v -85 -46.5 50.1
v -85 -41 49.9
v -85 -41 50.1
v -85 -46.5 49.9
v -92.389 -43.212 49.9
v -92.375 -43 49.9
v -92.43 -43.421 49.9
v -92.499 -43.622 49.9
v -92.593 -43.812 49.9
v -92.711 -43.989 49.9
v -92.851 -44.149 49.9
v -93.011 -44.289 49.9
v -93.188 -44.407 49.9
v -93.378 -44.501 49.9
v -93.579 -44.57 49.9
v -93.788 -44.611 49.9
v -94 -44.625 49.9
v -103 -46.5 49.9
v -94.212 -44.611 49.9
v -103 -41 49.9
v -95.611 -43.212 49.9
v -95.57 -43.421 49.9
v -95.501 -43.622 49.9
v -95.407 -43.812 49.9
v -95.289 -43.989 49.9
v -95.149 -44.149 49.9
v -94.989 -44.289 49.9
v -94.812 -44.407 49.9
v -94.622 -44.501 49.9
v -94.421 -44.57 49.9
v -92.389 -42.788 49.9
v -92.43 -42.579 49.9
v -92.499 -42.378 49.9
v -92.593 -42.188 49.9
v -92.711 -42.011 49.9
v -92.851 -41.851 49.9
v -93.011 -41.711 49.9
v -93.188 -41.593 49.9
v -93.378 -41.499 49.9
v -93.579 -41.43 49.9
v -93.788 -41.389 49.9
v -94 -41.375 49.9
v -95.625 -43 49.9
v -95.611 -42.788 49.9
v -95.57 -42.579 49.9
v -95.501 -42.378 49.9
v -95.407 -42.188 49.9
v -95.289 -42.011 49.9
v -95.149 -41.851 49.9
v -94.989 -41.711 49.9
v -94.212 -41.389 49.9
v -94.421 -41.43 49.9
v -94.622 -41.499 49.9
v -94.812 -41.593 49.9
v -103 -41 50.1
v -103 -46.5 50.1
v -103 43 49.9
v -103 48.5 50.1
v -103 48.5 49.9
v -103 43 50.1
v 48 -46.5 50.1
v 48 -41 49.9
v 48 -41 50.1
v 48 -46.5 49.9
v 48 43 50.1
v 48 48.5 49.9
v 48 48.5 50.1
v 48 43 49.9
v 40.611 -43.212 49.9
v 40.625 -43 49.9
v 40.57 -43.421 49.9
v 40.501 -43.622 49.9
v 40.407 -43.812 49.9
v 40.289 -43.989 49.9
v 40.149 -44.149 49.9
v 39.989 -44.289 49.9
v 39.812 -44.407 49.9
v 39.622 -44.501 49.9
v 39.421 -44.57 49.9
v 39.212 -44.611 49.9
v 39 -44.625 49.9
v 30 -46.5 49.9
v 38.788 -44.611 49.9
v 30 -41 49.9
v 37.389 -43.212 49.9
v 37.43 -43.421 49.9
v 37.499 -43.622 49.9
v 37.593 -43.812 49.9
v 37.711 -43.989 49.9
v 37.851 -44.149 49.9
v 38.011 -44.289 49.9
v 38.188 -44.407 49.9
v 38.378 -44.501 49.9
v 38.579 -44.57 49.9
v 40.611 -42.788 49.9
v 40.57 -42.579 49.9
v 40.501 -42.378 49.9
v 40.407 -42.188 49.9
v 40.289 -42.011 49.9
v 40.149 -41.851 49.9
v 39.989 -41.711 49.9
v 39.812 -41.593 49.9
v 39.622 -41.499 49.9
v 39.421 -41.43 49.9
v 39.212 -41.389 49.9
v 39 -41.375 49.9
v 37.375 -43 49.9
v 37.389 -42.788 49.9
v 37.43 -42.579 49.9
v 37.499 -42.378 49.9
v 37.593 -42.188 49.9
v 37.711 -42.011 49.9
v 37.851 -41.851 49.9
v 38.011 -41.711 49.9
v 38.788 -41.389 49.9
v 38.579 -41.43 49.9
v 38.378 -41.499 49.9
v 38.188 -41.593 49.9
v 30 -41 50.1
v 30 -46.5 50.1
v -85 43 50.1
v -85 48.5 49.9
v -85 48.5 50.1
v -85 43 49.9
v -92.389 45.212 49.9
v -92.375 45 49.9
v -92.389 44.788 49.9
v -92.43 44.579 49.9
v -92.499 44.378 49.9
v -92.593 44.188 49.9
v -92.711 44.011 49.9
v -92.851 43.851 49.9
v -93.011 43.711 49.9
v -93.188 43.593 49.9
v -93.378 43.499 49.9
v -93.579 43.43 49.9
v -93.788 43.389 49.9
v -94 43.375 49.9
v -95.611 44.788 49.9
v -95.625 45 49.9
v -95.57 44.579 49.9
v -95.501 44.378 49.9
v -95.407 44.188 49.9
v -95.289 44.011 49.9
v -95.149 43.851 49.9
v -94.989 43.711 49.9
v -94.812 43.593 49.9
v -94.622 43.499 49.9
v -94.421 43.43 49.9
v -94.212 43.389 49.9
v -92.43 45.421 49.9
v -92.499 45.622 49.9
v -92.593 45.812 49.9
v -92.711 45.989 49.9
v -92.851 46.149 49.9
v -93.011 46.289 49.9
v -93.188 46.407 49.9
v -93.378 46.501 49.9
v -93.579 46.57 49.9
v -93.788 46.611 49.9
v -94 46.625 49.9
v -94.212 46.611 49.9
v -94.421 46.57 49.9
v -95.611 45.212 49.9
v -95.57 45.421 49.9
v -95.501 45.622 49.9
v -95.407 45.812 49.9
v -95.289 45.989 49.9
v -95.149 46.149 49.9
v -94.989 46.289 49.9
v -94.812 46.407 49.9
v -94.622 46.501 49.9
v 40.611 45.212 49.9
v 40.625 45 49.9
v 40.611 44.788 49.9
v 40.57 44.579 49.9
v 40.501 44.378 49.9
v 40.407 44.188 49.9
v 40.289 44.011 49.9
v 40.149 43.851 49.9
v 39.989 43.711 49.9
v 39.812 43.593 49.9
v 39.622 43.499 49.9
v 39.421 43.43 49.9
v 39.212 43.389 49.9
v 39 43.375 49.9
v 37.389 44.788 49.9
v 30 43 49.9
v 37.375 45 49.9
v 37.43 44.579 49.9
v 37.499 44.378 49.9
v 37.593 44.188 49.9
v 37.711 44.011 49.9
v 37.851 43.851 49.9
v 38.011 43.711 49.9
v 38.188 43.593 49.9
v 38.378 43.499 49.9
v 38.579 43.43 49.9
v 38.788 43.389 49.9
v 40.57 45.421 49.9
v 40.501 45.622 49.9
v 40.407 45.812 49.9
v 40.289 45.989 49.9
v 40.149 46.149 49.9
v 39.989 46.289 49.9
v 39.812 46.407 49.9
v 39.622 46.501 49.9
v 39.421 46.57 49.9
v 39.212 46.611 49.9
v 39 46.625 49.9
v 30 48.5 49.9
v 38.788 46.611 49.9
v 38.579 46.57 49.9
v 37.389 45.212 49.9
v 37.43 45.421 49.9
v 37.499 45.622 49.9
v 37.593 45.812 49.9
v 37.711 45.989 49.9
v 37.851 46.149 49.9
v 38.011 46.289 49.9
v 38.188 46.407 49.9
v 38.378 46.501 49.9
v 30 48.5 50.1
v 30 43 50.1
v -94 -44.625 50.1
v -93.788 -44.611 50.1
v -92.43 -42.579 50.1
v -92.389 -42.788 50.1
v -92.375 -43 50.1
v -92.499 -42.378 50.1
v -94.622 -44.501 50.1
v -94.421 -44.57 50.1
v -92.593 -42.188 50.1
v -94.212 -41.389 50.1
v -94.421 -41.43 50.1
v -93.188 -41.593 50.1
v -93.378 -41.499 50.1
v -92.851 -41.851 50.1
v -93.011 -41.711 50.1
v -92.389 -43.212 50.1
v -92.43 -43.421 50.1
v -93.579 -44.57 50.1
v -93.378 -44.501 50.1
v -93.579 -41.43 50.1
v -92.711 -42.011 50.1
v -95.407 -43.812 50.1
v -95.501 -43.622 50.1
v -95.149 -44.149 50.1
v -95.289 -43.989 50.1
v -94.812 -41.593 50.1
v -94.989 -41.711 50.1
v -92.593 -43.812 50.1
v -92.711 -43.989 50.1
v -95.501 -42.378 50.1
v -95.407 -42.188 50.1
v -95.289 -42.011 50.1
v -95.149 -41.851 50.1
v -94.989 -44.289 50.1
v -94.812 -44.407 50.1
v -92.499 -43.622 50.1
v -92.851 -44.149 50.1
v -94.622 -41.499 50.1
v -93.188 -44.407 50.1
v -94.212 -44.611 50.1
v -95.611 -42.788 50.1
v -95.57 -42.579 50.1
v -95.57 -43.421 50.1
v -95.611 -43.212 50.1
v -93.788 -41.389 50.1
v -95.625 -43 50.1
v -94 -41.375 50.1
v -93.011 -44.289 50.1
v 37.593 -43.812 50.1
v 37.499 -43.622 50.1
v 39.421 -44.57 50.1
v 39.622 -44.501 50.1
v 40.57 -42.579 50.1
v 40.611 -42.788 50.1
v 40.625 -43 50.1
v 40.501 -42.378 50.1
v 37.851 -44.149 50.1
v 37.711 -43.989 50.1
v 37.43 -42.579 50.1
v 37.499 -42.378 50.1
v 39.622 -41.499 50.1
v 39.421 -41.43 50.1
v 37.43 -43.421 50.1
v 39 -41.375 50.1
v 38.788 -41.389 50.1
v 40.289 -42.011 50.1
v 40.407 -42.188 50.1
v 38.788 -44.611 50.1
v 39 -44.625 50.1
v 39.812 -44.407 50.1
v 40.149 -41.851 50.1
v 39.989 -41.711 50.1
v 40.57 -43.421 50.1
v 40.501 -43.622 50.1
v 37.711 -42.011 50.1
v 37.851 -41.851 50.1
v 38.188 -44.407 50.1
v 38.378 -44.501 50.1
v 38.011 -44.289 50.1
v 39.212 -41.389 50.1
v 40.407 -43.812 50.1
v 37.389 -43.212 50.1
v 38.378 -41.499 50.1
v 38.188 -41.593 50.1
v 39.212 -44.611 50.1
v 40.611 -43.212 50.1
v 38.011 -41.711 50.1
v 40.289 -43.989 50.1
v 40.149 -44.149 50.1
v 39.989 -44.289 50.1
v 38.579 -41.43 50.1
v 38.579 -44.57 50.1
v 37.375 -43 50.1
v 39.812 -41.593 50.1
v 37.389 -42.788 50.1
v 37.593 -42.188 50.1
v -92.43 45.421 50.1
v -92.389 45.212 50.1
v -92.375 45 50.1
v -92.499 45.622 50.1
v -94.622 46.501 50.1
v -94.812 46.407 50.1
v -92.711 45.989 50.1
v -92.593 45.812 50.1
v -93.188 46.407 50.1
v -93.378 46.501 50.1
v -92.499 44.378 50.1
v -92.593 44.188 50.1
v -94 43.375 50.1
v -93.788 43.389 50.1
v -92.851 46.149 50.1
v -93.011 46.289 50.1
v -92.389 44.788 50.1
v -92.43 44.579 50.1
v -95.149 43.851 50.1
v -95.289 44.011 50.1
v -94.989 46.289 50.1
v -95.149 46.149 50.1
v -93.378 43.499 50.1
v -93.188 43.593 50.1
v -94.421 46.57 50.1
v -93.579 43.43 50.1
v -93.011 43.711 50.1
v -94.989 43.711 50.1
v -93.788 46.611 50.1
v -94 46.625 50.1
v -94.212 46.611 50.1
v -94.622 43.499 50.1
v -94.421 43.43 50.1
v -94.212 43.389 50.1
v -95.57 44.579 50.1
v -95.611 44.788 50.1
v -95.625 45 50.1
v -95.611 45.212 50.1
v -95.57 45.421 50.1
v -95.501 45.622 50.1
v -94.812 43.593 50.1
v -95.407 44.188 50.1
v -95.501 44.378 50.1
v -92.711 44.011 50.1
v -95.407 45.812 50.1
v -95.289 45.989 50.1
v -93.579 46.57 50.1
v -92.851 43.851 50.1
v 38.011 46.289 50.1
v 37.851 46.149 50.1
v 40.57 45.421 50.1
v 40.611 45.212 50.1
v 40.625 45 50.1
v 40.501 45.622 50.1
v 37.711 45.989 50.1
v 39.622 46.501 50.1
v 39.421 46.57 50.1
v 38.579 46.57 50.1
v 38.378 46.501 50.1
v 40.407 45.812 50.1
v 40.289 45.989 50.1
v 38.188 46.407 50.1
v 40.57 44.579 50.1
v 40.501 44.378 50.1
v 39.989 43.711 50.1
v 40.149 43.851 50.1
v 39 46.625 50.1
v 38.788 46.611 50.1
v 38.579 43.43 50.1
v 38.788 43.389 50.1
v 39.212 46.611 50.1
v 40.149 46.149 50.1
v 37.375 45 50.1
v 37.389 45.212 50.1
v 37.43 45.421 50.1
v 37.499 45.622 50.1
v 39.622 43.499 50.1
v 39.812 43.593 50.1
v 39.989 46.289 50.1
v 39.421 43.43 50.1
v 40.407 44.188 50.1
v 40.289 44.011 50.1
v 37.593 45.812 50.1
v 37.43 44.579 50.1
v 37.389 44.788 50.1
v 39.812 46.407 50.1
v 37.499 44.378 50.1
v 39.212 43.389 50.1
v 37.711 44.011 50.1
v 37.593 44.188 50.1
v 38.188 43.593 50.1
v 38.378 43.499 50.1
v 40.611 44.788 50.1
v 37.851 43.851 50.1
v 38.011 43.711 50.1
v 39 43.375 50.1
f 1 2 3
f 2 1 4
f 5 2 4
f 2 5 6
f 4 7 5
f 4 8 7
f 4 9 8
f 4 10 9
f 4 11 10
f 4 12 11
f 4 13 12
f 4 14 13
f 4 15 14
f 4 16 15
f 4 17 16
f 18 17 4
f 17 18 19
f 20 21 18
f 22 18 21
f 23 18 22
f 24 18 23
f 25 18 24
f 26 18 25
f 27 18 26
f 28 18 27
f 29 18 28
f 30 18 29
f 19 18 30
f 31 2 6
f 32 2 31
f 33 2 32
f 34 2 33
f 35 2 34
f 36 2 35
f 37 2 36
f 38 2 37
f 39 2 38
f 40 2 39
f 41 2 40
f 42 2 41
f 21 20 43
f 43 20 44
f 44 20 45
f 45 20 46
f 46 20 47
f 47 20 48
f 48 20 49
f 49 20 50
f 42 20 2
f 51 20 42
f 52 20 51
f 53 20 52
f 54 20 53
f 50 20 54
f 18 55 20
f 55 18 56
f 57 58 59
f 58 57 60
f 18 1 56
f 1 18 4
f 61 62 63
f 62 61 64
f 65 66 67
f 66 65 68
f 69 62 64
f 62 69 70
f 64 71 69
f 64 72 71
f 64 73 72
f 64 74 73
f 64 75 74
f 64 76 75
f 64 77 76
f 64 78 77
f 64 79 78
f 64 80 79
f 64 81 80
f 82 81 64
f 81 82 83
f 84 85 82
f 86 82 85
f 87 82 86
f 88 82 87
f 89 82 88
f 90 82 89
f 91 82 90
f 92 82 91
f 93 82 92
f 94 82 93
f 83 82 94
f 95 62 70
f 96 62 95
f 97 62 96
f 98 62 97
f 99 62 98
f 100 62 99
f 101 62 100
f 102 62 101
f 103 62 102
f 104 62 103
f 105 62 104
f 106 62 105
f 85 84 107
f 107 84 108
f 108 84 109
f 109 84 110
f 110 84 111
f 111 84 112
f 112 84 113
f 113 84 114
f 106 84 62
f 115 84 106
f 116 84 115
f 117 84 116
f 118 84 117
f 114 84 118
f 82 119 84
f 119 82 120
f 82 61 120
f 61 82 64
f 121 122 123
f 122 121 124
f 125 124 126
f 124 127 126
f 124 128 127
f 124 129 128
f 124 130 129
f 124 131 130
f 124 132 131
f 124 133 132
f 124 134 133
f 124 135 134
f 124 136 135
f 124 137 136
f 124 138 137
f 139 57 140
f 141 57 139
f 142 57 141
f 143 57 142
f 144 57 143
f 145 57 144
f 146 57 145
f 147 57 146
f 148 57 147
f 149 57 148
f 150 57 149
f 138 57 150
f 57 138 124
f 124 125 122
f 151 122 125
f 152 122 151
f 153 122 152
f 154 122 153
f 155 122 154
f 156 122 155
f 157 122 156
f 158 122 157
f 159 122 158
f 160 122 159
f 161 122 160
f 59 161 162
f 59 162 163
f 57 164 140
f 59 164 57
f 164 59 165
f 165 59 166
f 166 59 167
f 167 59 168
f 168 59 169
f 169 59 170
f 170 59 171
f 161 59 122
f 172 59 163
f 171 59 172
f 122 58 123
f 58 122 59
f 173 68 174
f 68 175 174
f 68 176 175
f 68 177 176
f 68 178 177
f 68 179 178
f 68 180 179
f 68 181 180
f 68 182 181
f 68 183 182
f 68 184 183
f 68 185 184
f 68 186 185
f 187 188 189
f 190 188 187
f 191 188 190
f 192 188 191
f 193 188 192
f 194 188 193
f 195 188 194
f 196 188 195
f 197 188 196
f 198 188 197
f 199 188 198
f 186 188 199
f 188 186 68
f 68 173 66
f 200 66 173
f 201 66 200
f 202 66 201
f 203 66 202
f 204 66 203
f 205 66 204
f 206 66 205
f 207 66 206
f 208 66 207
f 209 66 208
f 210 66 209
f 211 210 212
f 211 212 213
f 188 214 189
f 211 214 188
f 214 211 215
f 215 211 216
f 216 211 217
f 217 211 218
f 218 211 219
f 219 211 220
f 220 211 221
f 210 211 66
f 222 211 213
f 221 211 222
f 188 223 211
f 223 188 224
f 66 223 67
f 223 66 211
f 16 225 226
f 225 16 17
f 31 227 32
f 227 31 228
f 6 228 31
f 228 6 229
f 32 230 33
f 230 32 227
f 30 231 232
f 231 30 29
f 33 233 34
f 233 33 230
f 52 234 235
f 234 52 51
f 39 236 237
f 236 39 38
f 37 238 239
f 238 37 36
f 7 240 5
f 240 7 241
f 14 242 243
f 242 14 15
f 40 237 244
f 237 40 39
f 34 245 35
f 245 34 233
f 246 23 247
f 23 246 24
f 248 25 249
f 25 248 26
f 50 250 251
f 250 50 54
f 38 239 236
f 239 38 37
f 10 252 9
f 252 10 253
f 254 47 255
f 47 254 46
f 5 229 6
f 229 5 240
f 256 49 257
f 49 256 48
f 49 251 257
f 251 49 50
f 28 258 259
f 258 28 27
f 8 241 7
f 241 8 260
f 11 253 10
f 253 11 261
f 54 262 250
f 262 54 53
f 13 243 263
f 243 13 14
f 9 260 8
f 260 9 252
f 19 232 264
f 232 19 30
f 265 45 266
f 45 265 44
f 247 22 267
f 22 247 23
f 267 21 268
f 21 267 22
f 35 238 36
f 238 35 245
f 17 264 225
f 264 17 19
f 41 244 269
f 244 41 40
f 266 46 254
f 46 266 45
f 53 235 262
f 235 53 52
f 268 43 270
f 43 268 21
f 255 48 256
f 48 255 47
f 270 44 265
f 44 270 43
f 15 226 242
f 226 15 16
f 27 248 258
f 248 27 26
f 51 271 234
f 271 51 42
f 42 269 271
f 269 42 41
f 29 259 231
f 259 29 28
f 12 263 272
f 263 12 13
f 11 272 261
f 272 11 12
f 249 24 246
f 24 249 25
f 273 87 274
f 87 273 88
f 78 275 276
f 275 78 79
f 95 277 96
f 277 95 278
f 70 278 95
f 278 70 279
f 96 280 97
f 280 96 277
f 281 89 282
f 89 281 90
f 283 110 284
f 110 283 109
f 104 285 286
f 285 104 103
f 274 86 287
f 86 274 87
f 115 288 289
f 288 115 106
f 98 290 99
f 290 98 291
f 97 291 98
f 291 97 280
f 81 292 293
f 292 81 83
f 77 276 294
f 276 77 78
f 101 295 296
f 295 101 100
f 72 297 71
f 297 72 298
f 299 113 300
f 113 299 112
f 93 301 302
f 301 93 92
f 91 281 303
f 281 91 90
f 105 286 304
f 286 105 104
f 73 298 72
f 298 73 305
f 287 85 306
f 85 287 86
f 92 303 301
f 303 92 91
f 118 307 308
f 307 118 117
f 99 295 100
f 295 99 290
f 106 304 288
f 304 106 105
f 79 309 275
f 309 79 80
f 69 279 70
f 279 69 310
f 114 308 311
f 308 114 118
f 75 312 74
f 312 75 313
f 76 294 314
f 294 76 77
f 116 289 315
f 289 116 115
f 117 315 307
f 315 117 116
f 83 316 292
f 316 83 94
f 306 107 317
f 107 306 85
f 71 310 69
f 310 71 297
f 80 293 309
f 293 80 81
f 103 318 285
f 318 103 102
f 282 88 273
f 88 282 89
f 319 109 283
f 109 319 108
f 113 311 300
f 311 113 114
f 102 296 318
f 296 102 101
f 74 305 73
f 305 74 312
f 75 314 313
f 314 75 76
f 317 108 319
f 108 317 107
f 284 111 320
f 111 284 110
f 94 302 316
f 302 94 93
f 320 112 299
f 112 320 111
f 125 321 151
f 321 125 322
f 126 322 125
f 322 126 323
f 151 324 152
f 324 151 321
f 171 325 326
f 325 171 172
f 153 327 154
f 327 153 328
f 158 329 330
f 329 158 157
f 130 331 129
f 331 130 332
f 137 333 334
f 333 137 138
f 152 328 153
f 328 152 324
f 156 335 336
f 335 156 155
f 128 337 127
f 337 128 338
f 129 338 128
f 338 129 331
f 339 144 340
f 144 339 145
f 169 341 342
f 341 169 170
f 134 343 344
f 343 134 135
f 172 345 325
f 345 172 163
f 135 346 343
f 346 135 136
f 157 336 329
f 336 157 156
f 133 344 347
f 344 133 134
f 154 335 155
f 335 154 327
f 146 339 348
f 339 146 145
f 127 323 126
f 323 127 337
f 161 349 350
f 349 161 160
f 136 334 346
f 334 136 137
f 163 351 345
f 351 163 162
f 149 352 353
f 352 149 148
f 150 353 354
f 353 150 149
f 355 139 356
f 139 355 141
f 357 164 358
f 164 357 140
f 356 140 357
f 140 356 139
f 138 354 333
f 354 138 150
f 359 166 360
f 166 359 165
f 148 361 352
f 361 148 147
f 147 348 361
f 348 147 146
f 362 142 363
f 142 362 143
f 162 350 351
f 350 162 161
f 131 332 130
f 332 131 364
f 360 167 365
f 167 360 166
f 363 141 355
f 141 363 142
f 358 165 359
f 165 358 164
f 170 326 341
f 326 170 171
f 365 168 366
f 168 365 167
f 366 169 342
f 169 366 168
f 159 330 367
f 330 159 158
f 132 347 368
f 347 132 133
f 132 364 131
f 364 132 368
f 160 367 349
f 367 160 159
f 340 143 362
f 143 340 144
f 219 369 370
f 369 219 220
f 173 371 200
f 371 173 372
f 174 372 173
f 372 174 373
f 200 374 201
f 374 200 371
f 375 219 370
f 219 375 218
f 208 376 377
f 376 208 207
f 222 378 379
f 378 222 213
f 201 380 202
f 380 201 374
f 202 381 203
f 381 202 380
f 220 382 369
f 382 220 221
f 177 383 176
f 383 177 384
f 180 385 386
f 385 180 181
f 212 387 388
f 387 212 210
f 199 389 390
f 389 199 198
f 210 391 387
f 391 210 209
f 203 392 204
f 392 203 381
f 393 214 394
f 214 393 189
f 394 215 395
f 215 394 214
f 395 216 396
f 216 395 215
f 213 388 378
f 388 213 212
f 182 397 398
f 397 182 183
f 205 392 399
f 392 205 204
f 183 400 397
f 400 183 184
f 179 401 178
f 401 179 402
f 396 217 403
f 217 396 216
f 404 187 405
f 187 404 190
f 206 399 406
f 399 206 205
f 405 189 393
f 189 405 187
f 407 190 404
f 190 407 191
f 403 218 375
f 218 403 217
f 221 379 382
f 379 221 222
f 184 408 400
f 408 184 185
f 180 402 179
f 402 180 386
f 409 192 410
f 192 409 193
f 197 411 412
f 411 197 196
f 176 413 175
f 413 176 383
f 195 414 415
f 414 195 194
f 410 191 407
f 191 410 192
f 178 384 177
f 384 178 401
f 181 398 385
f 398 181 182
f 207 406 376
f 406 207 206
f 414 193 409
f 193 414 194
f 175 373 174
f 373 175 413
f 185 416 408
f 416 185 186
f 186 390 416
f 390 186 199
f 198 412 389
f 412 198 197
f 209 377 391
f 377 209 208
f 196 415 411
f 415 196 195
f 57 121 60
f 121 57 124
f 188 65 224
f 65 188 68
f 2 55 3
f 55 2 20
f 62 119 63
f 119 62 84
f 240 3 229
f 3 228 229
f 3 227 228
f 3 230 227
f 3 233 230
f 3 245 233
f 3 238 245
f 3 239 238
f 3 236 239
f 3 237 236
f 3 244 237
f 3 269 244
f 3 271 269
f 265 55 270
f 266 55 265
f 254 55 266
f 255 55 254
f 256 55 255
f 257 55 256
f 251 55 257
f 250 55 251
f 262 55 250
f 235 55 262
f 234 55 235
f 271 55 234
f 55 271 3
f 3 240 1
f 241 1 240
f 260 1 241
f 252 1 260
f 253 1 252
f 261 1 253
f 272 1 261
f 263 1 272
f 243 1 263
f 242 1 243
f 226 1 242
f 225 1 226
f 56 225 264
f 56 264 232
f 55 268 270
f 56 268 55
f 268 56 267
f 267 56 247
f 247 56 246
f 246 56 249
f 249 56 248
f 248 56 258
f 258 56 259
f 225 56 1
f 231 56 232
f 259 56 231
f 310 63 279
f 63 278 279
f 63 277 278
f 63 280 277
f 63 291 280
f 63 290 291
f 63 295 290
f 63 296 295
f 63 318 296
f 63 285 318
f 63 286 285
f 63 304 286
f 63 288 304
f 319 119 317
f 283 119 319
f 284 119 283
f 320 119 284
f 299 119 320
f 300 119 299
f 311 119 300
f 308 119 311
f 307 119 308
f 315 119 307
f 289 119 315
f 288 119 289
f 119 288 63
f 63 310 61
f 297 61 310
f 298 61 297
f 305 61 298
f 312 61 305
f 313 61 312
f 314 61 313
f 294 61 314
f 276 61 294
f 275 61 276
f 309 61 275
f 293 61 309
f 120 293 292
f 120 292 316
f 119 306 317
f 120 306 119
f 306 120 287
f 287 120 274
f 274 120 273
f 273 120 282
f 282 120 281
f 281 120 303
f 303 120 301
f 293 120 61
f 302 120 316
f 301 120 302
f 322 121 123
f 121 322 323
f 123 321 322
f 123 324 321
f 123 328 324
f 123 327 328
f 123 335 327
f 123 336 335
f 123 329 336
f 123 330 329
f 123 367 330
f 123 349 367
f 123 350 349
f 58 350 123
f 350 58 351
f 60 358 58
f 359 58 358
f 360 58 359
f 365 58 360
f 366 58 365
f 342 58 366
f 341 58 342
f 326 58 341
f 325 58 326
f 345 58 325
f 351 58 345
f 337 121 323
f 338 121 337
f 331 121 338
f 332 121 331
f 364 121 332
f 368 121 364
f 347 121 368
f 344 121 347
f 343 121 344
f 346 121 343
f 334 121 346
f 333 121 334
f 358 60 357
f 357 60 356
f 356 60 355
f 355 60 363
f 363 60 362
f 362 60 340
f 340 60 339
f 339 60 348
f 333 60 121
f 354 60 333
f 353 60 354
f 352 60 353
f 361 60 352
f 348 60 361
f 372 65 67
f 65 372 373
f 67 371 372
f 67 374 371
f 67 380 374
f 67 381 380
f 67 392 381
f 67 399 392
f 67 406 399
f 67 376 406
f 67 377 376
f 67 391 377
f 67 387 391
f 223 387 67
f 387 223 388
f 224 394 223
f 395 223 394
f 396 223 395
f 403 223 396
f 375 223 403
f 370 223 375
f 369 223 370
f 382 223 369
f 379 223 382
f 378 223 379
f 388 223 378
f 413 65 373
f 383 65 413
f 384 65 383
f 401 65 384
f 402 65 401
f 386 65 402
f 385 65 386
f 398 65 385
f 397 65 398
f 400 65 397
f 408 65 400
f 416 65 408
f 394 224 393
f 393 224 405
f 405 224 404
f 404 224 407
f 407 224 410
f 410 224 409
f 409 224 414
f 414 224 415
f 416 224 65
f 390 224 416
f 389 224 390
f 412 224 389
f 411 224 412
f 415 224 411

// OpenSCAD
// file: ../../../cad/v3/hardware.scad
include <params.scad>
use <enclosure.scad>
// PROVISIONAL purchased component envelopes; not production part drawings.
module motor() {
 union() {
  translate([screw_x-6,motor_front-motor_l,motor_bottom]) cube([12,motor_l,10]);
  yrod(screw_x,motor_front-0.1,axis_z,shaft_d,shaft_l+0.1);
  for(x=[screw_x-3,screw_x+3]) translate([x-0.5,motor_front-motor_l-2,motor_bottom+4.5]) cube([1,2.1,1]);
 }
}
module shaft() { yrod(screw_x,motor_front,axis_z,shaft_d,shaft_l); }
module drive_nut(t=0) {
 difference() {
  translate([screw_x,carriage_back+t+nut_slot_y+0.1,axis_z]) rotate([-90,0,0]) union() {
   cylinder(d=nut_af/cos(30),h=nut_height,$fn=6);
   cylinder(d=nut_flange_d,h=nut_flange_t);
  }
  yrod(screw_x,carriage_back+t+nut_slot_y,axis_z,shaft_d+0.2,nut_height+0.2);
 }
}
module battery_holder(raise=0) {
 // Conservative single envelope including cell, contacts and holder.
 translate([93.2,-52,4.5+raise]) cube([22,74,21]);
}
module esp() {
 union() {
  translate([77.5,28,8.3]) cube([17.8,22.5,1.2]);
  translate([78.5,29,9.5]) cube([15.8,20.5,5]);
  translate([81.5,47,9.5]) cube([9,5,3.3]);
 }
}
module power_board() { translate([99,29,8.3]) cube([15,20,7.2]); }
module bridge_board() { translate([98.5,29,20.3]) cube([15,20,7]); }
module oled() {
 union() {
  translate([87.6,53.5,21.5]) cube([27.8,1.6,27.3]);
  translate([88.15,55.1,25]) cube([26.7,1.4,19.3]);
  translate([96.5,50.5,46]) cube([10,3,2.8]);
 }
}
module button() {
 union() {
  xrod(button_panel_x-button_body_l,button_y,button_z,button_body_d,button_body_l);
  xrod(button_panel_x,button_y,button_z,button_flange_d,2);
  xrod(button_panel_x+2,button_y,button_z,12.9,button_face_l-2);
  // Candidate fastening nut envelope; actual nut diameter/thickness to measure.
  difference() {
   xrod(button_panel_x-6,button_y,button_z,17.8,3);
   xrod(button_panel_x-6.1,button_y,button_z,button_hole_d,3.2);
  }
  // Two terminals only; solder and bend radius need physical confirmation.
  for(y=[button_y-2.425,button_y+2.425])
   translate([button_panel_x-button_body_l-button_terminal_l,y-.3,button_z-1]) cube([button_terminal_l,.6,2]);
 }
}
module acrylic() { translate([window_x0-2,window_y0-2,window_pane_z]) cube([window_x1-window_x0+4,window_y1-window_y0+4,window_pane_t]); }
module hinge_pin() { xrod(hinge_pin_x,hinge_y,hinge_z,2,hinge_pin_len); }
module thread_insert(x,y,z) {
 difference() {
  zhole(x,y,z,insert_od,insert_len);
  zhole(x,y,z-.1,2.05,insert_len+.2);
 }
}
module inserts_fixed() {
 for(p=battery_screws) thread_insert(p[0],p[1],2.9);
 for(x=keeper_x) thread_insert(x,keeper_y,44.3);
}
module inserts_lid() {
 for(p=window_clamps) thread_insert(p[0],p[1],window_ear_top);
}
module battery_connector() { translate([91.5,22,12.5]) cube([4.3,5,5]); }
module motor_pads() {
 // 0.3 mm compressed adhesive shim specification, not unspecified empty space.
 translate([78.5,motor_front-motor_l+.1,motor_bottom-0.3]) cube([12,motor_l-.2,0.3]);
 translate([78.5,motor_front-motor_l+.1,motor_top]) cube([12,motor_l-.2,0.3]);
 difference() {
  translate([78.5,-15,motor_bottom]) cube([12,0.3,10]);
  yrod(screw_x,-15.1,axis_z,4.7,0.6);
 }
 // Rear pad clears the two solder terminals.
 difference() {
  translate([78.5,motor_front-motor_l-.3,motor_bottom]) cube([12,0.3,10]);
  translate([80,motor_front-motor_l-.4,motor_bottom+4]) cube([9,0.5,2]);
 }
}
module board_pads() {
 translate([77.5,28,7.4]) cube([17.8,22.5,0.9]);
 translate([99,29,7.4]) cube([15,20,0.9]);
 translate([98.5,29,19.8]) cube([15,20,0.5]);
}

// Illustrative screw envelopes. Intentional pilot-thread interference is excluded
// from solid collision assertions. They remain in preview, BOM and total bounds.
module screw_down(x,y,top,len,d=2,flush=false) {
 color([0.45,0.47,0.5]) {
  zhole(x,y,top-len,d,len);
  if(flush) translate([x,y,top-1.3]) cylinder(d1=d,d2=4,h=1.3);
  else zhole(x,y,top,d==3?5.5:3.6,d==3?2:1.4);
 }
}
// Canonical fastener table: x,y,z,length,diameter,flush,rotationX,headless,owners.
// Preview and interference verification consume this SAME table.
// Stable connection names: keep existing names when adapting module brackets.
function fastener_ids(kind="fixed") = kind=="drive" ? ["F-nut-cap-left","F-nut-cap-right"] :
 kind=="lid" ? ["F-latch-left","F-latch-right","F-window-rear-left","F-window-rear-right","F-window-front-left","F-window-front-right"] :
 ["F-lock-rear-left","F-lock-rear-right","F-lock-front-left","F-lock-front-right",
 "F-guide-rear-left","F-guide-rear-right","F-guide-front","F-motor-left","F-motor-right",
 "F-tray-left","F-tray-right","F-deck-left","F-deck-right","F-esp-left","F-esp-right",
 "F-driver-left","F-driver-right","F-oled-left","F-oled-right",
 "F-battery-rear-left","F-battery-rear-right","F-battery-front-left","F-battery-front-right",
 "F-hinge-left","F-hinge-right"];
function fastener_specs(kind="fixed",t=0) = kind=="drive" ?
 [for(x=[screw_x-4.5,screw_x+4.5]) [x,carriage_back+t-0.2,46,6,2,false,0,false,["nut_cap","nut_carriage"]]] :
 kind=="lid" ? concat(
 [for(x=[93.5,112.5]) [x,8.5,45.2,8,3,false,180,false,["latch_retainer","lid"]]],
 [for(p=window_clamps) [p[0],p[1],window_inner_z,6,2,true,180,false,["window_grille","lid"]]]) :
 concat(
 [for(p=lock_mounts) [p[0],p[1],32.4,6,2,false,0,false,["lock_base","base_box"]]],
 [for(p=guide_screws) [p[0],p[1],44.9,8,2,false,0,false,["guide_cap","lock_base"]]],
 [for(p=motor_screws) [p[0],p[1],motor_clamp_z+2,8,2,false,0,false,["motor_clamp","lock_base"]]],
 [for(p=tray_screws) [p[0],p[1],7.4,4,2,false,0,false,["electronics_tray","base_box"]]],
 [for(p=deck_screws) [p[0],p[1],19.8,6,2,false,0,false,["upper_deck","electronics_tray"]]],
 [for(x=[76.2,96.7]) [x,39,16.8,6,2,false,0,false,["esp_clip","electronics_tray"]]],
 [for(x=[97,115]) [x,38,29.6,6,2,false,0,false,["upper_clip","upper_deck"]]],
 [for(x=[86.8,115.8]) [x,56.3,51,6,2,true,0,false,["oled_bridge","base_box"]]],
 [for(p=battery_screws) [p[0],p[1],0,8,2,true,180,false,["battery_hatch","base_box"]]],
 [for(i=[0:1]) [keeper_x[i],keeper_y,51.1,6,2,true,0,false,[i==0?"hinge_guard_left":"hinge_guard_right","base_box","inserts_fixed"]]]);
module render_screw(s) {
 translate([s[0],s[1],s[2]]) rotate([s[6],0,0])
 if(s[7]) zhole(0,0,-s[3],s[4],s[3]);
 else screw_down(0,0,0,s[3],s[4],s[5]);
}
module fixed_fasteners() { for(s=fastener_specs("fixed")) render_screw(s); }
module moving_fasteners(t=0) { for(s=fastener_specs("drive",t)) render_screw(s); }
module lid_fasteners() { for(s=fastener_specs("lid")) render_screw(s); }
// file: ../../../cad/v3/electronics.scad
include <params.scad>

module electronics_tray() {
 nominal_difference() {
  union() {
   cube_at([74.5,25.5,5.4],[42,27,2]);
   cube_at([74.5,25.5,7.3],[2.5,27,0.7]);
   cube_at([114,25.5,7.3],[2.5,27,0.7]);
   for(p=deck_screws) translate([p[0],p[1],7.3]) cylinder(r=1.3,h=10.7);
   for(x=[76.2,96.7]) cube_at([x-1.2,37,7.3],[2.4,4,7.5]);
  }
  for(p=tray_screws) pilot(p,5.2,8.2,2.4);
  for(x=[90,117]) zhole(x,24,5.2,6.4,3.2);
  for(p=deck_screws) pilot(p,13,18.2,1.7);
  for(x=[76.2,96.7]) zhole(x,39,9.8,1.7,5.2);
  // Tie slots for the lower power board; underside remains accessible off-box.
  for(x=[99.5,112.75]) cube_at([x,33,5.2],[tie_slot_width,8,3.2]);
 }
}
module upper_deck() {
 nominal_difference() {
  union() {
   cube_at([96,25.3,18],[21,27.2,1.8]);
   cube_at([96,27,19.7],[2.3,24,1.8]);
   cube_at([114.3,27,19.7],[2.7,24,1.8]);
   for(x=[97,115]) cube_at([x-1.3,36,19.7],[2.6,4,7.9]);
  }
  for(p=deck_screws) pilot(p,17.8,20,2.4);
  zhole(96.7,39,17.8,4,0.6);
  for(x=[97,115]) zhole(x,38,22.3,1.7,5.5);
 }
}
module esp_clip() {
 nominal_difference() {
  cube_at([74.5,37,14.8],[24,4,2]);
  for(x=[76.2,96.7]) zhole(x,39,14.6,2.4,2.4);
 }
}
module upper_clip() {
 nominal_difference() {
  cube_at([95.5,36,27.6],[21.5,4,2]);
  for(x=[97,115]) zhole(x,38,27.4,2.2,2.4);
 }
}
module oled_bridge() {
 nominal_difference() {
  cube_at([84.3,52.5,49.2],[34,6.1,1.8]);
  for(x=[86.8,115.8]) {
   zhole(x,56.3,49,2.4,2.2);
   countersink(x,56.3,49.7,2.4,4,1.3);
  }
 }
}
// file: ../../../cad/v3/lock.scad
include <params.scad>

module lock_base() {
 nominal_difference() {
  union() {
   cube_at([75,-46,lock_floor],[41,68,3]);
   // Continuous independent bolt support: bed, keyed rail, removable roof.
   cube_at([91,-19,lock_floor_top],[20,24.5,guide_bottom-lock_floor_top]);
   cube_at([bolt_x-key_w/2,-19,key_z0],[key_w,24.5,key_z1-key_z0]);
   for(p=guide_screws) translate([p[0],p[1],lock_floor_top-0.01]) cylinder(r=2.3,h=guide_top-lock_floor_top+0.01);
   for(p=motor_screws) translate([p[0],p[1],lock_floor_top-0.01]) cylinder(r=2.2,h=motor_clamp_z-lock_floor_top+0.01);
   // Motor cradle and front locating shoulder; clamp presses through thin pads.
   cube_at([77.2,-41.8,32.4],[14.6,27.5,motor_bottom-0.3-32.4]);
   cube_at([77.2,-16,32.4],[14.6,2.3,motor_clamp_z-32.4]);
   // Blind front socket: usable bore ends Y=19.8; last 1 mm is solid.
   cube_at([bolt_x-6,14.8,32.4],[12,6,11.6]);
  }
  // Conservative 25x12x10 body; includes the 2.5mm output offset.
  cube_at([screw_x-motor_w/2-0.3,motor_front-motor_l-0.3,motor_bottom-0.3],[motor_w+0.6,motor_l+0.6,motor_h+0.6]);
  yhole(screw_x,-16.3,axis_z,4.7,4);
  // Top-open U seat permits vertical insertion of motor + threaded drive.
  cube_at([screw_x-2.35,-16.3,axis_z],[4.7,4,motor_clamp_z-axis_z+0.2]);
  cube_at([bolt_x-latch_hole/2,13.8,axis_z-latch_hole/2],[latch_hole,6,latch_hole]);
  for(p=lock_mounts) pilot(p,29.2,32.6,2.4);
  for(p=guide_screws) pilot(p,33.2,43.1);
  for(p=motor_screws) pilot(p,motor_clamp_z-6,motor_clamp_z+0.2);
  // Flat reusable rail for future mechanical feedback adapters (SKU pending).
  for(y=[-12,2]) for(x=[112,115]) cube_at([x,y,29.2],[tie_slot_width,5,3.5]);
  // Wiring channels; no closed tunnel around the actuator.
  cube_at([110,15,29.2],[3,7.2,3.5]);
 }
}
module guide_cap() {
 nominal_difference() {
  cube_at([92,-20.5,guide_top],[23,26,guide_cap_t]);
  for(p=guide_screws) pilot(p,42.7,45.1,2.4);
 }
}
module motor_clamp() {
 nominal_difference() {
  cube_at([73.8,-35,motor_clamp_z],[21.4,16,2]);
  for(p=motor_screws) pilot(p,motor_clamp_z-0.2,motor_clamp_z+2.2,2.4);
  cube_at([90.8,-20.7,motor_clamp_z-0.2],[4.6,1.8,2.4]);
 }
}
module bolt_raw(t=0) {
 rear=bolt_back+t;
 nominal_difference() {
  union() {
   cube_at([bolt_x-body_w/2,rear-4,axis_z-body_w/2],[body_w,body_l+4,body_w]);
   cube_at([bolt_x-3,rear+body_l,axis_z-3],[6,tongue_l-taper_l+0.01,6]);
   translate([bolt_x,rear+body_l+tongue_l-taper_l,axis_z]) rotate([-90,0,0])
    linear_extrude(height=taper_l,scale=5/6) square([6,6],center=true);
   // Fork overlaps the main body; lateral/vertical float around the drive finger.
   cube_at([92,rear,axis_z-body_w/2],[7.6,6,body_w]);
  }
  cube_at([91,rear+1.7,35.2],[8.6,2.6,5.6]);
  cube_at([bolt_x-(key_w+0.6)/2,rear-4.1,33.2],[key_w+0.6,body_l+4.2,1.6]);
 }
}
module bolt(t=0,shift=0) { translate([0,0,shift]) bolt_raw(t); }
module nut_carriage(t=0) {
 rear=carriage_back+t;
 nominal_difference() {
  union() {
   cube_at([screw_x-7,rear-2,33.4],[13,10,10.6]);
   cube_at([screw_x+4.5,rear-1.5,36],[8.7,2,4]);
  }
  yhole(screw_x,rear-3,axis_z,shaft_d+0.4,12);
  translate([screw_x,rear+nut_slot_y,axis_z]) rotate([-90,0,0]) {
   cylinder(d=nut_slot_d,h=nut_slot_t,$fn=6);
   cylinder(d=nut_flange_d+0.4,h=nut_flange_t+0.2);
  }
  // Wide open top access for the nut: larger than its circumdiameter.
  cube_at([screw_x-5.3,rear+nut_slot_y,axis_z],[10.6,nut_slot_t,6.2]);
  for(x=[screw_x-4.5,screw_x+4.5]) zhole(x,rear-0.2,39.5,1.7,4.7);
 }
}
module nut_cap(t=0) {
 rear=carriage_back+t;
 nominal_difference() {
  cube_at([screw_x-6.5,rear-2,44],[12.5,10,2]);
  for(x=[screw_x-4.5,screw_x+4.5]) zhole(x,rear-0.2,43.8,2.4,2.4);
 }
}
module fit_bar() { cube([tongue_w,tongue_w,25]); }
module fit_gauge() {
 nominal_difference() {
  cube([30,14,8]);
  for(i=[0:2]) cube_at([2+i*9,3,-0.1],[6.4+i*0.2,6.4+i*0.2,8.2]);
 }
}
// file: ../../../cad/v3/enclosure.scad
include <params.scad>

module base_box() {
 nominal_difference() {
  union() {
   nominal_difference() {
    linear_extrude(height=shell_top) rounded_rect(L,W,4);
    translate([0,0,floor_t]) linear_extrude(height=49) rounded_rect(L-2*wall,W-2*wall,1);
   }
   cube_at([70.5,-57,2.9],[3,114,48.1]);
   // Stationary rear header reaches the same closed height as the lid.
   intersection() {
    cube_at([-117,-60,47],[234,9,8]);
    union() { cube_at([-118,-61,46],[236,11,5]); xrod(-118,hinge_y,hinge_z,8,236); }
   }
   for(k=fixed_knuckles) xrod(k[0],hinge_y,hinge_z,hinge_od,k[1]-k[0]);
   for(x=keeper_x) cube_at([x-4,-54,43.5],[8,6.5,4.8]);
   // Battery chamber: side/end walls and a fixed ceiling connected to outer wall.
   cube_at([90,-54.5,2.9],[2.7,79,23.1]);
   cube_at([90,-54.5,2.9],[30,2.2,23.1]);
   cube_at([90,22.3,2.9],[30,2.2,23.1]);
   cube_at([90,-54.5,26],[30,79,3.4]);
   for(p=battery_screws) translate([p[0],p[1],2.8]) cylinder(r=3,h=5.5);
   for(p=lock_mounts) if(p[0]<90) translate([p[0],p[1],2.9]) cylinder(r=3,h=26.5);
   for(p=tray_screws) translate([p[0],p[1],2.9]) cylinder(r=2.3,h=2.5);
   // OLED bottom stop and two connected side rails.
   cube_at([85.3,53,19.2],[32.4,4.1,2]);
   cube_at([85.3,53,21.1],[2.3,4.1,28.1]);
   cube_at([115.4,53,21.1],[2.3,4.1,28.1]);
   // Recessed side-wall panel: 5.7mm button face stays inside X=120.
   difference() {
    xrod(button_panel_x-3,button_y,button_z,21,120-(button_panel_x-3));
    xrod(button_panel_x,button_y,button_z,18.8,120-button_panel_x+.1);
   }

  }
  // A continuous bore is essential: otherwise the fixed header traps the pin.
  xhole(-120.1,hinge_y,hinge_z,hinge_bore,240.2);
  // Moving hinge knuckles and webs get a rectangular swept-side relief.
  for(k=moving_knuckles) cube_at([k[0]-0.3,-60.2,46.6],[k[1]-k[0]+0.6,9.8,9]);
  for(x=keeper_x) {
   cube_at([x-4.3,-58.3,48.3],[8.6,11.1,7]);
   zhole(x,keeper_y,43.8,2.4,4.6);
   let($feature_kind="insert") zhole(x,keeper_y,44.2,insert_hole_d(),4.2);
  }
  // Battery extraction aperture, and a shallow seat for the flush service plate.
  cube_at([92.7,-52.3,-0.1],[22.6,74.6,8.6]);
  cube_at([87.7,-56.3,-0.1],[31.6,82.6,3]);
  for(p=battery_screws) {
   pilot(p,2.7,8.4,2.4);
   let($feature_kind="insert") zhole(p[0],p[1],2.8,insert_hole_d(),4.1);
  }
  for(p=lock_mounts) pilot(p,26.2,29.6,1.7);
  for(p=tray_screws) pilot(p,3.1,5.6,1.7);
  // Battery connector passage enters the electronics bay, not the actuator above.
  cube_at([91,21.8,12],[7,3.4,6]);
  // Front optical window / recessed button. There is deliberately no USB hole.
  cube_at([87.7,56.7,24.5],[27.6,3.6,20.5]);
  xhole(button_panel_x-3.1,button_y,button_z,button_hole_d,3.2);
  xhole(button_panel_x,button_y,button_z,18.8,120-button_panel_x+.1);
  // PCB insertion channels; stop ledge remains below them.
  cube_at([87.3,53.2,21.3],[28.4,2.2,28.2]);
  cube_at([84.2,52.4,49.2],[34.2,6.3,1.9]);
  for(x=[86.8,115.8]) zhole(x,56.3,43,1.7,6.5);
 }
}
module lid() {
 union() {
 nominal_difference() {
  union() {
   cube_at([-120,-50.5,lid_bottom],[240,110.5,H-lid_bottom]);
   for(k=moving_knuckles) {
    xrod(k[0],hinge_y,hinge_z,hinge_od,k[1]-k[0]);
    cube_at([k[0],-53,51.4],[k[1]-k[0],4,3.6]);
   }
   // Internal T-head receiver and inside-only retainer screw lands.
   cube_at([92,3,46.7],[22,11,4.8]);
   // Inside-only hard stops carry screw preload instead of crushing the pane.
   for(p=window_clamps) cube_at([p[0]-9,p[1]-3.5,window_ear_top],[18,7,lid_bottom+0.1-window_ear_top]);
  }
  for(k=moving_knuckles) xhole(k[0]-0.1,hinge_y,hinge_z,hinge_bore,k[1]-k[0]+0.2);
  cube_at([window_x0,window_y0,window_ear_top-0.1],[window_x1-window_x0,window_y1-window_y0,H-window_ear_top+0.2]);
  // Interior rebate clears the pane; the outside grille closes it.
  cube_at([window_x0-3,window_y0-3,window_ear_top-0.1],[window_x1-window_x0+6,window_y1-window_y0+6,window_outer_z-window_ear_top+0.1]);
  cube_at([94.7,5.7,46.6],[16.6,5.6,3.7]);
  cube_at([97.2,5.7,45.8],[11.6,5.6,4.5]);
  for(x=[93.5,112.5]) zhole(x,8.5,45.8,2.4,8.4);
  for(p=window_clamps) {
   zhole(p[0],p[1],window_ear_top-0.1,2.4,54.2-window_ear_top+0.1);
   let($feature_kind="insert") zhole(p[0],p[1],window_ear_top-0.1,insert_hole_d(),4.1);
  }
 }
 // Union after cutting the opening: five short-span ribs join both edges.
 translate([0,0,window_outer_z]) linear_extrude(height=H-window_outer_z) window_grid_2d();
 }
}
module latch() {
 nominal_difference() {
  union() {
   cube_at([bolt_x-5.5,latch_y,latch_z0],[11,5,43.1-latch_z0]);
   cube_at([bolt_x-latch_neck_w/2,latch_y,43],[latch_neck_w,5,2.1]);
   cube_at([bolt_x-5.5,latch_y,45],[11,5,2.1]);
   cube_at([bolt_x-8,latch_y,47],[16,5,3]);
  }
  cube_at([bolt_x-latch_hole/2,latch_y-0.1,axis_z-latch_hole/2],[latch_hole,5.2,latch_hole]);
 }
}
module latch_retainer() {
 nominal_difference() {
  cube_at([92,3,retainer_z],[22,11,retainer_t]);
  cube_at([97.2,5.7,45],[11.6,5.6,2]);
  for(x=[93.5,112.5]) zhole(x,8.5,45,3.4,2);
 }
}
module window_grid_2d() {
 union() {
  nominal_difference() {
   translate([window_x0-3,window_y0-3]) square([window_x1-window_x0+6,window_y1-window_y0+6]);
   translate([window_x0,window_y0]) square([window_x1-window_x0,window_y1-window_y0]);
  }
  for(x=window_bar_x) {
   translate([x-window_bar_w/2,window_y0-2]) square([window_bar_w,window_y1-window_y0+4]);
   // Concave radius at all four rib roots, tangent to rib and window frame.
   for(side=[-1,1]) for(end=[0,1])
    translate([x+side*window_bar_w/2,end?window_y1:window_y0]) scale([side,end?-1:1])
     nominal_difference() { square([window_root_r,window_root_r]); translate([window_root_r,window_root_r]) circle(r=window_root_r); }
  }
 }
}
module window_grille() {
 nominal_difference() {
  union() {
   translate([0,0,window_inner_z]) linear_extrude(height=window_inner_t) window_grid_2d();
   for(p=window_clamps) cube_at([p[0]-9,p[1]-3.5,window_inner_z],[18,7,window_ear_t]);
  }
  for(p=window_clamps) {
   zhole(p[0],p[1],window_inner_z-0.1,2.4,window_inner_t+0.2);
   countersink(p[0],p[1],window_inner_z-0.01,4.2,2.4,1.31);
  }
 }
}
module battery_hatch() {
 nominal_difference() {
  union() {
   cube_at([88,-56,0],[31,82,2.6]);
   for(x=[96,112]) for(y=[-47,17]) cube_at([x-2,y-2,2.5],[4,4,1.8]);
  }
  for(p=battery_screws) {
   pilot(p,-0.1,2.8,2.4);
   countersink(p[0],p[1],-0.01,4.2,2.4,1.3);
  }
 }
}
module hinge_guard(side=-1) {
 x=side<0?keeper_x[0]:keeper_x[1];
 stop=side<0?hinge_pin_x-pin_end_play-keeper_wall:hinge_pin_x+hinge_pin_len+pin_end_play;
 nominal_difference() {
  union() {
   intersection() {
    union() {
     cube_at([x-4,-58,53],[8,7.2,2]);
     cube_at([x-4,-52,48.3],[8,1.2,6.7]);
     // End cheek remains within the fixed hinge's radial envelope.
     cube_at([stop,-58,48.3],[keeper_wall,6,6.7]);
    }
    xrod(x-4.1,hinge_y,hinge_z,8.4,8.2);
   }
   cube_at([x-4,-53.6,48.3],[8,6.1,2.8]);
  }
  zhole(x,keeper_y,48.1,2.4,3.2);
  countersink(x,keeper_y,49.8,2.4,4,1.3);
  zhole(x,keeper_y,51.09,4.2,4);
 }
}

module insert_coupon() {
 nominal_difference() {
  cube([36,12,6]);
  for(i=[0:2]) {
   zhole(6+i*12,6,1.8,2.8+i*.1,4.3);
   countersink(6+i*12,6,5.6,2.8+i*.1,3.5,.5);
  }
 }
}
module keeper_insert_coupon() {
 nominal_difference() {
  cube([8,6.5,4.8]);
  zhole(4,3.5,.3,2.4,4.6);
  zhole(4,3.5,.7,insert_pilot_d,4.2);
 }
}
module window_insert_coupon() {
 nominal_difference() {
  cube([18,7,5.1]);
  zhole(9,3.5,-.1,2.4,4.4);
  zhole(9,3.5,-.1,insert_pilot_d,4.1);
 }
}
module hinge_bore_coupon() {
 nominal_difference() {
  cube([20,30,8]);
  for(i=[0:2]) xhole(-.1,5+i*10,4,2.2+i*.2,20.2);
 }
}
// file: ../../../cad/v3/references.scad
// Generated from engineering/references.json; do not edit.
// SHA256 f9069af00d99415f6bf80c07423463d1202e891299ade11124e069a9ba9990c0
// Visual corner/platform profiles are approximate. Dimensions are nominal mm.
module reference_phone() {
 translate([-23,0,0]) union() {
  translate([0,0,9.43]) linear_extrude(height=8.75)
   offset(r=12) square([139.4,54.0],center=true);
  translate([-55.7,0,6.88])
   linear_extrude(height=2.55) offset(r=9) square([28,56],center=true);
  translate([-67.33,-24.630000000000003,5]) cylinder(d=16.2,h=1.88,$fn=64);
  translate([-48.09,-24.630000000000003,5]) cylinder(d=16.2,h=1.88,$fn=64);
  translate([-57.71000000000001,-6.640000000000001,5]) cylinder(d=16.2,h=1.88,$fn=64);
  translate([-50.870000000000005,-39.45,12.475]) cube([6.9,.45,2.66]);
  translate([-38.870000000000005,-39.45,12.475]) cube([11.2,.45,2.66]);
  translate([-24.67,-39.45,12.475]) cube([11.2,.45,2.66]);
  translate([-35.02,39.0,12.475]) cube([17.7,.45,2.66]);
  translate([21.56999999999999,39.0,12.475]) cube([17.1,.45,2.66]);
 }
}
module reference_card() {
 translate([-7,0,18.18])
 linear_extrude(height=0.76) offset(r=3.18)
 square([79.24,47.62],center=true);
}
// file: ../../../cad/v3/params.scad
// TetherLock V3 STRUCTURAL PROTOTYPE. mm / degrees. Hardware SKUs NOT frozen.
// World: X long direction; +Y front; Z bottom=0. Closed assembly <=240x120x55.
$fn=48;
L=240; W=120; H=55;
wall=3; floor_t=3; shell_top=51; lid_bottom=51.4;
divider_x=72; divider_t=3;
hinge_y=-55; hinge_z=51; hinge_od=8; hinge_bore=2.4;
fixed_knuckles=[[-102,-90],[-30,-18],[42,54]];
moving_knuckles=[[-89.6,-78],[-17.6,-6],[54.4,66]];
hinge_pin_x=-107; hinge_pin_len=180;
keeper_x=[-108,77.5]; keeper_y=-50.5;
pin_end_play=0.5; keeper_wall=1.5;
insert_od=3.2; insert_len=4; insert_pilot_d=2.9;
$print_bores=false;
function insert_hole_d() = $print_bores ? insert_pilot_d : insert_od+0.05;
stroke=14;
bolt_x=103; axis_z=38; bolt_back=-14.5; carriage_back=-11;
body_w=9.2; body_l=6; tongue_w=6; tongue_l=13.5; taper_l=0.8;
guide_clearance=0.3;
screw_x=84.5; motor_front=-15;
// Seller image: gearbox 9; motor text 16 vs drawing 15; reserve 25 total.
// Output offset 2.5: rotate motor about its shaft so body is ABOVE the axis.
motor_l=25; motor_w=12; motor_h=10; motor_axis_offset=2.5;
shaft_l=55; shaft_d=4; shaft_pitch=0.7; shaft_length_tolerance=1;
motor_bottom=axis_z+motor_axis_offset-motor_h/2;
motor_top=motor_bottom+motor_h; motor_clamp_z=motor_top+0.3;
// Supplier flange nut NOT dimensioned: conservative adjustable candidate.
nut_af=7; nut_flange_d=10; nut_height=5; nut_flange_t=1;
// R16-503 drawing; threaded mounting diameter remains provisional 16mm.
button_y=30; button_z=40.5; button_panel_x=114;
button_hole_d=16.4; button_body_d=15.8; button_flange_d=17.8;
button_body_l=18.3; button_terminal_l=6; button_face_l=5.7;
tie_width=2.5; tie_slot_width=3.0;
lock_floor=29.4; lock_floor_top=32.4;
guide_bottom=33.1; guide_top=42.9; guide_cap_t=2;
key_w=2.8; key_z0=33.0; key_z1=34.5;
nut_slot_d=nut_af/cos(30)+0.4; nut_slot_y=1.5; nut_slot_t=nut_height+0.4;
latch_y=6; latch_t=5; latch_hole=6.8;
latch_z0=32.6; latch_neck_w=6;
retainer_z=45.2; retainer_t=1.5;
window_x0=-100; window_x1=45; window_y0=-38; window_y1=40;
window_clamps=[[-94,-43],[39,-43],[-94,45],[39,45]];
window_bar_x=[-76,-52,-28,-4,20]; window_bar_w=5; window_root_r=2;
window_outer_z=52; window_pane_t=1.5;
window_pane_z=window_outer_z-window_pane_t;
// Pane contact and screw ears are independent: preload is carried by the ears.
window_inner_z=47.4; window_inner_t=3.1;
window_inner_top=window_inner_z+window_inner_t;
window_ear_t=2.5; window_ear_top=window_inner_z+window_ear_t;
assert(window_inner_z>=47,"Window grille must preserve storage headroom");
lock_mounts=[[77,-43],[113,-43],[77,19],[113,19]];
guide_screws=[[93.5,-18],[114,-18],[114,-2]];
motor_screws=[[76,-27],[93,-27]];
battery_screws=[[90,-54],[117,-54],[90,24],[117,24]];
tray_screws=[[76,27],[115,51]];
deck_screws=[[97.5,27],[115,50.8]];
print_parts=["base_box","lid","lock_base","guide_cap","motor_clamp",
 "bolt","nut_carriage","nut_cap","latch","latch_retainer","window_grille",
 "battery_hatch","electronics_tray","upper_deck","esp_clip","upper_clip",
 "oled_bridge","hinge_guard_left","hinge_guard_right","fit_bar","fit_gauge",
 "insert_coupon","keeper_insert_coupon","window_insert_coupon","hinge_bore_coupon"];
assembly_parts=["base_box","lid","lock_base","guide_cap","motor_clamp",
 "bolt","nut_carriage","nut_cap","latch","latch_retainer",
 "window_grille",
 "battery_hatch","electronics_tray","upper_deck","esp_clip","upper_clip","oled_bridge",
 "hinge_guard_left","hinge_guard_right"];
hardware_parts=["motor","drive_nut","battery_holder","esp","power_board",
 "bridge_board","oled","button","acrylic","hinge_pin","inserts_fixed","inserts_lid",
 "battery_connector",
 "motor_pads","board_pads"];
// All holes below are pilot/clearance geometry, not modelled screw threads.
module feature(axis,center,d,h,kind="clearance",details=[]) {
 if(!is_undef($export_features) && $export_features)
  echo(["TL_FEATURE",$feature_part,axis,center,d,h,kind,details]);
}
// These wrappers keep CAD feature dimensions attached to the geometry that uses
// them. The boolean operation is part of the export, not guessed from a mesh.
module nominal_difference() {
 base=is_undef($feature_operation)?"solid":$feature_operation;
 difference() {
  let($feature_operation=base) children(0);
  if($children>1) for(i=[1:$children-1])
   let($feature_operation=base=="solid"?"cut":"solid") children(i);
 }
}
module cube_at(position,size) {
 feature("BOX",position,0,0,"box",[size,is_undef($feature_operation)?"solid":$feature_operation]);
 translate(position) cube(size);
}
module zhole(x,y,z,d,h) {
 feature("Z",[x,y,z],d,h,is_undef($feature_kind)?(d<2?"pilot":"clearance"):$feature_kind);
 translate([x,y,z]) cylinder(d=d,h=h);
}
module yrod(x,y,z,d,h) { translate([x,y,z]) rotate([-90,0,0]) cylinder(d=d,h=h); }
module xrod(x,y,z,d,h) { translate([x,y,z]) rotate([0,90,0]) cylinder(d=d,h=h); }
module yhole(x,y,z,d,h,kind="clearance") { feature("Y",[x,y,z],d,h,kind); yrod(x,y,z,d,h); }
module xhole(x,y,z,d,h,kind="clearance") { feature("X",[x,y,z],d,h,kind); xrod(x,y,z,d,h); }
module countersink(x,y,z,d1,d2,h) {
 feature("Z",[x,y,z],d1,h,"countersink",[d2]);
 translate([x,y,z]) cylinder(d1=d1,d2=d2,h=h);
}
module rounded_rect(l,w,r) { offset(r=r) square([l-2*r,w-2*r],center=true); }
module lid_turn(a) { translate([0,hinge_y,hinge_z]) rotate([a,0,0]) translate([0,-hinge_y,-hinge_z]) children(); }
module pilot(xy,z0,z1,d=1.7) { let($feature_kind=d<2?"pilot":"clearance") zhole(xy[0],xy[1],z0,d,z1-z0); }
// main file
include <../../../cad/v3/assembly.scad>
view="metadata";
intersection(){lid();translate([0,0,.2])window_grille();}
